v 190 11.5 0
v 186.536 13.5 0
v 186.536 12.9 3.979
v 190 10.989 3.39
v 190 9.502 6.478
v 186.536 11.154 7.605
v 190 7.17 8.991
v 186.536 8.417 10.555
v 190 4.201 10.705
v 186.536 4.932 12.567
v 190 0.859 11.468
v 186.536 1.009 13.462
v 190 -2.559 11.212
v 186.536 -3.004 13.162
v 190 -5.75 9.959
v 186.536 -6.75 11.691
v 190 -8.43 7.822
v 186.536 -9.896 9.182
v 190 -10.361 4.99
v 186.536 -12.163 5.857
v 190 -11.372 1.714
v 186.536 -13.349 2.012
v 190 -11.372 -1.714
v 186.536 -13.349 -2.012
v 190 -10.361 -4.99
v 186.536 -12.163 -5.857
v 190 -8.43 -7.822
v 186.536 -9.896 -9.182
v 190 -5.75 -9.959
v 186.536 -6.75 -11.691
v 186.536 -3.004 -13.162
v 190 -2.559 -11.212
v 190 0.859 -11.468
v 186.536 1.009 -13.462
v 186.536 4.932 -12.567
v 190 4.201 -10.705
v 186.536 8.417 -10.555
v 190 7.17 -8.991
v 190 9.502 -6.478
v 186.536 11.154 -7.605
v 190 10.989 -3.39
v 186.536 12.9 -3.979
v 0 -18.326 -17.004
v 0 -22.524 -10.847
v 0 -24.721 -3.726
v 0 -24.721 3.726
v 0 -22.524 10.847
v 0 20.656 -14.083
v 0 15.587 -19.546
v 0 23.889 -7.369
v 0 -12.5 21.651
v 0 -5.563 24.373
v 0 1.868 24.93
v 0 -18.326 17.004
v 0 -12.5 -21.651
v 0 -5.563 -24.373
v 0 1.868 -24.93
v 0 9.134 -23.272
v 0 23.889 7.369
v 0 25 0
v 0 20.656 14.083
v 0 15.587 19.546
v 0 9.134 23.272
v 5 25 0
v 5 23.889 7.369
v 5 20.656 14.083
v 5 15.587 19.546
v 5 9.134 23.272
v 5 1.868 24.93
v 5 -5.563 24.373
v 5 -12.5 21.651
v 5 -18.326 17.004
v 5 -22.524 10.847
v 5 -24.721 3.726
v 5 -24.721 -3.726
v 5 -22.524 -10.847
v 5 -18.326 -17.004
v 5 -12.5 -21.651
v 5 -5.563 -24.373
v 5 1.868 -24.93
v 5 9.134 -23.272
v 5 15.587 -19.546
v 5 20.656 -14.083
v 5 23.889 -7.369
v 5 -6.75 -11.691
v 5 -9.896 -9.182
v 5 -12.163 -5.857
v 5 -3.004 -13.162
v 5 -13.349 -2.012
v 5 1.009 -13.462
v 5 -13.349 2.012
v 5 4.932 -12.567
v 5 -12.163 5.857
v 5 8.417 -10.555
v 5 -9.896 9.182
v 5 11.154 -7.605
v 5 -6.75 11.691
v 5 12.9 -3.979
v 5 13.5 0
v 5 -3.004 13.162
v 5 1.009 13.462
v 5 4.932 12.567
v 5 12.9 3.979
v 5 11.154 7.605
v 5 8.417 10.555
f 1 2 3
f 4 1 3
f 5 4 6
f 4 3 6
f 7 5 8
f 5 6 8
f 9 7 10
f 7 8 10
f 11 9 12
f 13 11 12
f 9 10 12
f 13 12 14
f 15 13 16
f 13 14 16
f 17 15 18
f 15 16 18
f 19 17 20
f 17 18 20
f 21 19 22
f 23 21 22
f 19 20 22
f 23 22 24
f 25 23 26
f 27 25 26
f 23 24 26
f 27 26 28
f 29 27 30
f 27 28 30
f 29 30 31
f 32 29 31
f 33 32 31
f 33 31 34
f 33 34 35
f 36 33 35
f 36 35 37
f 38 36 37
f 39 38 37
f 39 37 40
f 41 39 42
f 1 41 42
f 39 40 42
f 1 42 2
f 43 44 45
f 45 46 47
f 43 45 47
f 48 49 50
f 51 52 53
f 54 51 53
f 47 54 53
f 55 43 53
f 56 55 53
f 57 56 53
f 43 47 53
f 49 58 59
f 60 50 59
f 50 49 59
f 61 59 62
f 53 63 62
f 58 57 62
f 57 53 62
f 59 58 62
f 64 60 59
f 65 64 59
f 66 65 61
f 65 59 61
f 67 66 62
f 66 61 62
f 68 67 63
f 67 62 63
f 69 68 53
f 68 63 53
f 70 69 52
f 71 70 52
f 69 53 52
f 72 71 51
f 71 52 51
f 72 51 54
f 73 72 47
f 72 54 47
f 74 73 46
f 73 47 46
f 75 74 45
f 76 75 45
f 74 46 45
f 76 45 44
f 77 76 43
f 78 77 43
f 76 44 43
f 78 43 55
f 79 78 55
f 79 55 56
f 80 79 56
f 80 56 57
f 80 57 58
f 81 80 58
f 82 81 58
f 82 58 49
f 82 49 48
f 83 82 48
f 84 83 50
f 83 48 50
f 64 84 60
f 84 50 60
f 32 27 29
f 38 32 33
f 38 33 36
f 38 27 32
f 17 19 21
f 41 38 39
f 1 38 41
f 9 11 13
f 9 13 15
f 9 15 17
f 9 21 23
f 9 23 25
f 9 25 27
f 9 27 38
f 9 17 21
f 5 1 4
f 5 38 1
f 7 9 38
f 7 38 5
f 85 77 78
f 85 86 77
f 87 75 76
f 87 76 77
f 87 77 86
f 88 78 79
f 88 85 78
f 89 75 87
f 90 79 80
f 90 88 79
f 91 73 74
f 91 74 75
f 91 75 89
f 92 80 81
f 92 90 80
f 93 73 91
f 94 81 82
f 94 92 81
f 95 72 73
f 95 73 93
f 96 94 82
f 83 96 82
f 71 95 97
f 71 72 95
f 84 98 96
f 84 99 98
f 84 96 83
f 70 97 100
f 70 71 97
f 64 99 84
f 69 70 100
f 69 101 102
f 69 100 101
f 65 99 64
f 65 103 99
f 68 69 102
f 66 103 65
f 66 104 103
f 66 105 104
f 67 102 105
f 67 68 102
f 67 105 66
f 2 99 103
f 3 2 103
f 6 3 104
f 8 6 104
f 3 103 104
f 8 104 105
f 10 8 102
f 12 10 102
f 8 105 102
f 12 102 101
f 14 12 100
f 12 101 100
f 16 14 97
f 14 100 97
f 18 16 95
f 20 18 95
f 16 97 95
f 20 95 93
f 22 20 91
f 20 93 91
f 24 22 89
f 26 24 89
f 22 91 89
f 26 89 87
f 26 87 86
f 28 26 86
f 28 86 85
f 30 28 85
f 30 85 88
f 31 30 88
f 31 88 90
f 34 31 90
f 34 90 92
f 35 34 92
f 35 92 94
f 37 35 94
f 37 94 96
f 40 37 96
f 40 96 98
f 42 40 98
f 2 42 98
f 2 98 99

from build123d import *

# Parameters (mm, degrees)
F0_R     = 13.5
F1_DEPTH = 190
F0_R_2   = 25
F2_DEPTH = 5
F3_SIZE2 = 3.4641016151
F3_SIZE  = 2


with BuildPart() as f1:
    # F0 (on Right) → F1 (new body)
    with BuildSketch(Plane.YZ):
        Circle(F0_R)
    extrude(amount=F1_DEPTH)

    # F0 (on Right) → F2 (join)
    with BuildSketch(Plane.YZ):
        Circle(F0_R_2)
        Circle(F0_R, mode=Mode.SUBTRACT)
    extrude(amount=F2_DEPTH)

    # F3
    f3_edges = [f1.edges().sort_by_distance(p)[0] for p in [
        (190, -13.5, 0),
    ]]
    f3_side = f1.faces().sort_by_distance((190, 0, 0))[0]
    chamfer(f3_edges, length=F3_SIZE, length2=F3_SIZE2, reference=f3_side)


solid = f1.part
